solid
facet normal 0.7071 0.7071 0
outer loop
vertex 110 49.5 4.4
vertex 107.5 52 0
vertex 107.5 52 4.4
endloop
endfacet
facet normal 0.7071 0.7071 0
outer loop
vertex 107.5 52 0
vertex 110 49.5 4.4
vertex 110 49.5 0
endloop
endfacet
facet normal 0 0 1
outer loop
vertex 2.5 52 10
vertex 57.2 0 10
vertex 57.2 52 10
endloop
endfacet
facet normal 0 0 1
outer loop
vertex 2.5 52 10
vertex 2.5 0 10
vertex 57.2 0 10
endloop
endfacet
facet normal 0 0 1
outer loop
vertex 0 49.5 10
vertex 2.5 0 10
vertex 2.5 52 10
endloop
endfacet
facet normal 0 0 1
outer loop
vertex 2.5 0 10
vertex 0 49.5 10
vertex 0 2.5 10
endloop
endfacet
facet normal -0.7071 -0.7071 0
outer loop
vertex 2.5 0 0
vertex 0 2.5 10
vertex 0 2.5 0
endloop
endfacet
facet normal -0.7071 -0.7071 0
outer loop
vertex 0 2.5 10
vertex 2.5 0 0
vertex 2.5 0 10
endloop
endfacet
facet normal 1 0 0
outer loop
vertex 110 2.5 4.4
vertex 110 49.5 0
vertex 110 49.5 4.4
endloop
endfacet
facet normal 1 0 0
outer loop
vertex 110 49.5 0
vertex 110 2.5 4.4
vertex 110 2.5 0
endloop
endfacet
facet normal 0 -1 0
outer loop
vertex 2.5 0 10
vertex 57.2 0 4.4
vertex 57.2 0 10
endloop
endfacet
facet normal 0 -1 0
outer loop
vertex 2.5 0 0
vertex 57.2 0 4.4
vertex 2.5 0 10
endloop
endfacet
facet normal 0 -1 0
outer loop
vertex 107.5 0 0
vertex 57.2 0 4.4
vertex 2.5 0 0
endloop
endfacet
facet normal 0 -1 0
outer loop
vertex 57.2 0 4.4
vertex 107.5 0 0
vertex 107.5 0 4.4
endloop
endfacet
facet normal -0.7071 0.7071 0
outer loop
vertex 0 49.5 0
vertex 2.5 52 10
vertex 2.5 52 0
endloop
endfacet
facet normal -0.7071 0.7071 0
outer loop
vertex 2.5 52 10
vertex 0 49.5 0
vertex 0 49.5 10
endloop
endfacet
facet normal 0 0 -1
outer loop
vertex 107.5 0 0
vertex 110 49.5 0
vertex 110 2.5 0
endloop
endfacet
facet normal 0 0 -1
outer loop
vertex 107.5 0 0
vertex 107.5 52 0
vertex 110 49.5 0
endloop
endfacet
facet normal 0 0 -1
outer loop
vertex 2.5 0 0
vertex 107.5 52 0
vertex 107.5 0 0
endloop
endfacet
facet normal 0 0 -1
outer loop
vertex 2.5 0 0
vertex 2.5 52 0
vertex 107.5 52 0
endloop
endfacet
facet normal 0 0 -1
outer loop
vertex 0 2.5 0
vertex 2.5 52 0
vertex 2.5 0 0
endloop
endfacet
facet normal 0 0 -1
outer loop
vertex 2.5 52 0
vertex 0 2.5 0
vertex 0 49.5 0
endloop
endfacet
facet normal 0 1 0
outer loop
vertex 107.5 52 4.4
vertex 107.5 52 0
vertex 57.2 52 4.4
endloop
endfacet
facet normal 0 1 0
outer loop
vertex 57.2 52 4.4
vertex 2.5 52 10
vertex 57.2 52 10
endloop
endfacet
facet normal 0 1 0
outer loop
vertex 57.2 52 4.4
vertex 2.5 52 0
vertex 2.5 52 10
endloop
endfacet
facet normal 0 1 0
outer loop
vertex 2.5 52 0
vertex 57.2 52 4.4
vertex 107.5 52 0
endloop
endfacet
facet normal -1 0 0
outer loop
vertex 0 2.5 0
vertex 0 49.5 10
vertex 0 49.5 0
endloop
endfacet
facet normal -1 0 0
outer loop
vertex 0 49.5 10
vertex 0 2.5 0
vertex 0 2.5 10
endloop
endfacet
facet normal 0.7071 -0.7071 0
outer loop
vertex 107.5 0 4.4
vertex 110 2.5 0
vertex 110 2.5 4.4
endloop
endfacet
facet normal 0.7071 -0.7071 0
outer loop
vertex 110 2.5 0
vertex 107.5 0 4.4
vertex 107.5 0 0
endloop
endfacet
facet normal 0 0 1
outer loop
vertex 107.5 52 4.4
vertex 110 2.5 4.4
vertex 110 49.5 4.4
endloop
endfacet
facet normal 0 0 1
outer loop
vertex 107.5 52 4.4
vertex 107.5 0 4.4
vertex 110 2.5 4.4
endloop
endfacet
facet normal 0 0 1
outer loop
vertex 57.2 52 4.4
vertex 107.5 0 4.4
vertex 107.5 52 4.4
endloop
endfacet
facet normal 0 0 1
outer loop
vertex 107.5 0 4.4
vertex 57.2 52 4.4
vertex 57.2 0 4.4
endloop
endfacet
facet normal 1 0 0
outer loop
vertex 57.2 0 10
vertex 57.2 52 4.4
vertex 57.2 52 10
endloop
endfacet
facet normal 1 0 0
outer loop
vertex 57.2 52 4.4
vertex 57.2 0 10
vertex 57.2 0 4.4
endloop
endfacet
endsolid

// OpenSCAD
$fn = 32;

// ----------------------------------------------------------------------
// Stepped bar: endstep, 110 x 52 x 10/4.4 mm
// ----------------------------------------------------------------------

// --- parameters (mm) ---
bar_l = 110;              // bar length, X
bar_w = 52;               // bar width, Y
plate_t = 10;             // thickness of the thick zone, Z
thin_t = 4.4;             // thickness of the thin zone
corner_c = 2.5;           // corner chamfer of the bar
step_cut = 5.6;           // material removed from the thin zone
step_x = 57.2;            // step position from the left end
depth_1 = 5.6;            // depth of cut 1 from the top face

profile = [[2.5, 0], [107.5, 0], [110, 2.5], [110, 49.5], [107.5, 52], [2.5, 52], [0, 49.5], [0, 2.5]];  // primary outline, 8 points, counter clockwise
void_1 = [[57.2, -1], [111, -1], [111, 53], [57.2, 53]];  // thin zone beyond the step, 4 points

// --- the one profile operation ---
difference() {
  linear_extrude(height = plate_t) polygon(points = profile);
  translate([0, 0, plate_t - depth_1])
    linear_extrude(height = depth_1 + 1) polygon(points = void_1);
}
